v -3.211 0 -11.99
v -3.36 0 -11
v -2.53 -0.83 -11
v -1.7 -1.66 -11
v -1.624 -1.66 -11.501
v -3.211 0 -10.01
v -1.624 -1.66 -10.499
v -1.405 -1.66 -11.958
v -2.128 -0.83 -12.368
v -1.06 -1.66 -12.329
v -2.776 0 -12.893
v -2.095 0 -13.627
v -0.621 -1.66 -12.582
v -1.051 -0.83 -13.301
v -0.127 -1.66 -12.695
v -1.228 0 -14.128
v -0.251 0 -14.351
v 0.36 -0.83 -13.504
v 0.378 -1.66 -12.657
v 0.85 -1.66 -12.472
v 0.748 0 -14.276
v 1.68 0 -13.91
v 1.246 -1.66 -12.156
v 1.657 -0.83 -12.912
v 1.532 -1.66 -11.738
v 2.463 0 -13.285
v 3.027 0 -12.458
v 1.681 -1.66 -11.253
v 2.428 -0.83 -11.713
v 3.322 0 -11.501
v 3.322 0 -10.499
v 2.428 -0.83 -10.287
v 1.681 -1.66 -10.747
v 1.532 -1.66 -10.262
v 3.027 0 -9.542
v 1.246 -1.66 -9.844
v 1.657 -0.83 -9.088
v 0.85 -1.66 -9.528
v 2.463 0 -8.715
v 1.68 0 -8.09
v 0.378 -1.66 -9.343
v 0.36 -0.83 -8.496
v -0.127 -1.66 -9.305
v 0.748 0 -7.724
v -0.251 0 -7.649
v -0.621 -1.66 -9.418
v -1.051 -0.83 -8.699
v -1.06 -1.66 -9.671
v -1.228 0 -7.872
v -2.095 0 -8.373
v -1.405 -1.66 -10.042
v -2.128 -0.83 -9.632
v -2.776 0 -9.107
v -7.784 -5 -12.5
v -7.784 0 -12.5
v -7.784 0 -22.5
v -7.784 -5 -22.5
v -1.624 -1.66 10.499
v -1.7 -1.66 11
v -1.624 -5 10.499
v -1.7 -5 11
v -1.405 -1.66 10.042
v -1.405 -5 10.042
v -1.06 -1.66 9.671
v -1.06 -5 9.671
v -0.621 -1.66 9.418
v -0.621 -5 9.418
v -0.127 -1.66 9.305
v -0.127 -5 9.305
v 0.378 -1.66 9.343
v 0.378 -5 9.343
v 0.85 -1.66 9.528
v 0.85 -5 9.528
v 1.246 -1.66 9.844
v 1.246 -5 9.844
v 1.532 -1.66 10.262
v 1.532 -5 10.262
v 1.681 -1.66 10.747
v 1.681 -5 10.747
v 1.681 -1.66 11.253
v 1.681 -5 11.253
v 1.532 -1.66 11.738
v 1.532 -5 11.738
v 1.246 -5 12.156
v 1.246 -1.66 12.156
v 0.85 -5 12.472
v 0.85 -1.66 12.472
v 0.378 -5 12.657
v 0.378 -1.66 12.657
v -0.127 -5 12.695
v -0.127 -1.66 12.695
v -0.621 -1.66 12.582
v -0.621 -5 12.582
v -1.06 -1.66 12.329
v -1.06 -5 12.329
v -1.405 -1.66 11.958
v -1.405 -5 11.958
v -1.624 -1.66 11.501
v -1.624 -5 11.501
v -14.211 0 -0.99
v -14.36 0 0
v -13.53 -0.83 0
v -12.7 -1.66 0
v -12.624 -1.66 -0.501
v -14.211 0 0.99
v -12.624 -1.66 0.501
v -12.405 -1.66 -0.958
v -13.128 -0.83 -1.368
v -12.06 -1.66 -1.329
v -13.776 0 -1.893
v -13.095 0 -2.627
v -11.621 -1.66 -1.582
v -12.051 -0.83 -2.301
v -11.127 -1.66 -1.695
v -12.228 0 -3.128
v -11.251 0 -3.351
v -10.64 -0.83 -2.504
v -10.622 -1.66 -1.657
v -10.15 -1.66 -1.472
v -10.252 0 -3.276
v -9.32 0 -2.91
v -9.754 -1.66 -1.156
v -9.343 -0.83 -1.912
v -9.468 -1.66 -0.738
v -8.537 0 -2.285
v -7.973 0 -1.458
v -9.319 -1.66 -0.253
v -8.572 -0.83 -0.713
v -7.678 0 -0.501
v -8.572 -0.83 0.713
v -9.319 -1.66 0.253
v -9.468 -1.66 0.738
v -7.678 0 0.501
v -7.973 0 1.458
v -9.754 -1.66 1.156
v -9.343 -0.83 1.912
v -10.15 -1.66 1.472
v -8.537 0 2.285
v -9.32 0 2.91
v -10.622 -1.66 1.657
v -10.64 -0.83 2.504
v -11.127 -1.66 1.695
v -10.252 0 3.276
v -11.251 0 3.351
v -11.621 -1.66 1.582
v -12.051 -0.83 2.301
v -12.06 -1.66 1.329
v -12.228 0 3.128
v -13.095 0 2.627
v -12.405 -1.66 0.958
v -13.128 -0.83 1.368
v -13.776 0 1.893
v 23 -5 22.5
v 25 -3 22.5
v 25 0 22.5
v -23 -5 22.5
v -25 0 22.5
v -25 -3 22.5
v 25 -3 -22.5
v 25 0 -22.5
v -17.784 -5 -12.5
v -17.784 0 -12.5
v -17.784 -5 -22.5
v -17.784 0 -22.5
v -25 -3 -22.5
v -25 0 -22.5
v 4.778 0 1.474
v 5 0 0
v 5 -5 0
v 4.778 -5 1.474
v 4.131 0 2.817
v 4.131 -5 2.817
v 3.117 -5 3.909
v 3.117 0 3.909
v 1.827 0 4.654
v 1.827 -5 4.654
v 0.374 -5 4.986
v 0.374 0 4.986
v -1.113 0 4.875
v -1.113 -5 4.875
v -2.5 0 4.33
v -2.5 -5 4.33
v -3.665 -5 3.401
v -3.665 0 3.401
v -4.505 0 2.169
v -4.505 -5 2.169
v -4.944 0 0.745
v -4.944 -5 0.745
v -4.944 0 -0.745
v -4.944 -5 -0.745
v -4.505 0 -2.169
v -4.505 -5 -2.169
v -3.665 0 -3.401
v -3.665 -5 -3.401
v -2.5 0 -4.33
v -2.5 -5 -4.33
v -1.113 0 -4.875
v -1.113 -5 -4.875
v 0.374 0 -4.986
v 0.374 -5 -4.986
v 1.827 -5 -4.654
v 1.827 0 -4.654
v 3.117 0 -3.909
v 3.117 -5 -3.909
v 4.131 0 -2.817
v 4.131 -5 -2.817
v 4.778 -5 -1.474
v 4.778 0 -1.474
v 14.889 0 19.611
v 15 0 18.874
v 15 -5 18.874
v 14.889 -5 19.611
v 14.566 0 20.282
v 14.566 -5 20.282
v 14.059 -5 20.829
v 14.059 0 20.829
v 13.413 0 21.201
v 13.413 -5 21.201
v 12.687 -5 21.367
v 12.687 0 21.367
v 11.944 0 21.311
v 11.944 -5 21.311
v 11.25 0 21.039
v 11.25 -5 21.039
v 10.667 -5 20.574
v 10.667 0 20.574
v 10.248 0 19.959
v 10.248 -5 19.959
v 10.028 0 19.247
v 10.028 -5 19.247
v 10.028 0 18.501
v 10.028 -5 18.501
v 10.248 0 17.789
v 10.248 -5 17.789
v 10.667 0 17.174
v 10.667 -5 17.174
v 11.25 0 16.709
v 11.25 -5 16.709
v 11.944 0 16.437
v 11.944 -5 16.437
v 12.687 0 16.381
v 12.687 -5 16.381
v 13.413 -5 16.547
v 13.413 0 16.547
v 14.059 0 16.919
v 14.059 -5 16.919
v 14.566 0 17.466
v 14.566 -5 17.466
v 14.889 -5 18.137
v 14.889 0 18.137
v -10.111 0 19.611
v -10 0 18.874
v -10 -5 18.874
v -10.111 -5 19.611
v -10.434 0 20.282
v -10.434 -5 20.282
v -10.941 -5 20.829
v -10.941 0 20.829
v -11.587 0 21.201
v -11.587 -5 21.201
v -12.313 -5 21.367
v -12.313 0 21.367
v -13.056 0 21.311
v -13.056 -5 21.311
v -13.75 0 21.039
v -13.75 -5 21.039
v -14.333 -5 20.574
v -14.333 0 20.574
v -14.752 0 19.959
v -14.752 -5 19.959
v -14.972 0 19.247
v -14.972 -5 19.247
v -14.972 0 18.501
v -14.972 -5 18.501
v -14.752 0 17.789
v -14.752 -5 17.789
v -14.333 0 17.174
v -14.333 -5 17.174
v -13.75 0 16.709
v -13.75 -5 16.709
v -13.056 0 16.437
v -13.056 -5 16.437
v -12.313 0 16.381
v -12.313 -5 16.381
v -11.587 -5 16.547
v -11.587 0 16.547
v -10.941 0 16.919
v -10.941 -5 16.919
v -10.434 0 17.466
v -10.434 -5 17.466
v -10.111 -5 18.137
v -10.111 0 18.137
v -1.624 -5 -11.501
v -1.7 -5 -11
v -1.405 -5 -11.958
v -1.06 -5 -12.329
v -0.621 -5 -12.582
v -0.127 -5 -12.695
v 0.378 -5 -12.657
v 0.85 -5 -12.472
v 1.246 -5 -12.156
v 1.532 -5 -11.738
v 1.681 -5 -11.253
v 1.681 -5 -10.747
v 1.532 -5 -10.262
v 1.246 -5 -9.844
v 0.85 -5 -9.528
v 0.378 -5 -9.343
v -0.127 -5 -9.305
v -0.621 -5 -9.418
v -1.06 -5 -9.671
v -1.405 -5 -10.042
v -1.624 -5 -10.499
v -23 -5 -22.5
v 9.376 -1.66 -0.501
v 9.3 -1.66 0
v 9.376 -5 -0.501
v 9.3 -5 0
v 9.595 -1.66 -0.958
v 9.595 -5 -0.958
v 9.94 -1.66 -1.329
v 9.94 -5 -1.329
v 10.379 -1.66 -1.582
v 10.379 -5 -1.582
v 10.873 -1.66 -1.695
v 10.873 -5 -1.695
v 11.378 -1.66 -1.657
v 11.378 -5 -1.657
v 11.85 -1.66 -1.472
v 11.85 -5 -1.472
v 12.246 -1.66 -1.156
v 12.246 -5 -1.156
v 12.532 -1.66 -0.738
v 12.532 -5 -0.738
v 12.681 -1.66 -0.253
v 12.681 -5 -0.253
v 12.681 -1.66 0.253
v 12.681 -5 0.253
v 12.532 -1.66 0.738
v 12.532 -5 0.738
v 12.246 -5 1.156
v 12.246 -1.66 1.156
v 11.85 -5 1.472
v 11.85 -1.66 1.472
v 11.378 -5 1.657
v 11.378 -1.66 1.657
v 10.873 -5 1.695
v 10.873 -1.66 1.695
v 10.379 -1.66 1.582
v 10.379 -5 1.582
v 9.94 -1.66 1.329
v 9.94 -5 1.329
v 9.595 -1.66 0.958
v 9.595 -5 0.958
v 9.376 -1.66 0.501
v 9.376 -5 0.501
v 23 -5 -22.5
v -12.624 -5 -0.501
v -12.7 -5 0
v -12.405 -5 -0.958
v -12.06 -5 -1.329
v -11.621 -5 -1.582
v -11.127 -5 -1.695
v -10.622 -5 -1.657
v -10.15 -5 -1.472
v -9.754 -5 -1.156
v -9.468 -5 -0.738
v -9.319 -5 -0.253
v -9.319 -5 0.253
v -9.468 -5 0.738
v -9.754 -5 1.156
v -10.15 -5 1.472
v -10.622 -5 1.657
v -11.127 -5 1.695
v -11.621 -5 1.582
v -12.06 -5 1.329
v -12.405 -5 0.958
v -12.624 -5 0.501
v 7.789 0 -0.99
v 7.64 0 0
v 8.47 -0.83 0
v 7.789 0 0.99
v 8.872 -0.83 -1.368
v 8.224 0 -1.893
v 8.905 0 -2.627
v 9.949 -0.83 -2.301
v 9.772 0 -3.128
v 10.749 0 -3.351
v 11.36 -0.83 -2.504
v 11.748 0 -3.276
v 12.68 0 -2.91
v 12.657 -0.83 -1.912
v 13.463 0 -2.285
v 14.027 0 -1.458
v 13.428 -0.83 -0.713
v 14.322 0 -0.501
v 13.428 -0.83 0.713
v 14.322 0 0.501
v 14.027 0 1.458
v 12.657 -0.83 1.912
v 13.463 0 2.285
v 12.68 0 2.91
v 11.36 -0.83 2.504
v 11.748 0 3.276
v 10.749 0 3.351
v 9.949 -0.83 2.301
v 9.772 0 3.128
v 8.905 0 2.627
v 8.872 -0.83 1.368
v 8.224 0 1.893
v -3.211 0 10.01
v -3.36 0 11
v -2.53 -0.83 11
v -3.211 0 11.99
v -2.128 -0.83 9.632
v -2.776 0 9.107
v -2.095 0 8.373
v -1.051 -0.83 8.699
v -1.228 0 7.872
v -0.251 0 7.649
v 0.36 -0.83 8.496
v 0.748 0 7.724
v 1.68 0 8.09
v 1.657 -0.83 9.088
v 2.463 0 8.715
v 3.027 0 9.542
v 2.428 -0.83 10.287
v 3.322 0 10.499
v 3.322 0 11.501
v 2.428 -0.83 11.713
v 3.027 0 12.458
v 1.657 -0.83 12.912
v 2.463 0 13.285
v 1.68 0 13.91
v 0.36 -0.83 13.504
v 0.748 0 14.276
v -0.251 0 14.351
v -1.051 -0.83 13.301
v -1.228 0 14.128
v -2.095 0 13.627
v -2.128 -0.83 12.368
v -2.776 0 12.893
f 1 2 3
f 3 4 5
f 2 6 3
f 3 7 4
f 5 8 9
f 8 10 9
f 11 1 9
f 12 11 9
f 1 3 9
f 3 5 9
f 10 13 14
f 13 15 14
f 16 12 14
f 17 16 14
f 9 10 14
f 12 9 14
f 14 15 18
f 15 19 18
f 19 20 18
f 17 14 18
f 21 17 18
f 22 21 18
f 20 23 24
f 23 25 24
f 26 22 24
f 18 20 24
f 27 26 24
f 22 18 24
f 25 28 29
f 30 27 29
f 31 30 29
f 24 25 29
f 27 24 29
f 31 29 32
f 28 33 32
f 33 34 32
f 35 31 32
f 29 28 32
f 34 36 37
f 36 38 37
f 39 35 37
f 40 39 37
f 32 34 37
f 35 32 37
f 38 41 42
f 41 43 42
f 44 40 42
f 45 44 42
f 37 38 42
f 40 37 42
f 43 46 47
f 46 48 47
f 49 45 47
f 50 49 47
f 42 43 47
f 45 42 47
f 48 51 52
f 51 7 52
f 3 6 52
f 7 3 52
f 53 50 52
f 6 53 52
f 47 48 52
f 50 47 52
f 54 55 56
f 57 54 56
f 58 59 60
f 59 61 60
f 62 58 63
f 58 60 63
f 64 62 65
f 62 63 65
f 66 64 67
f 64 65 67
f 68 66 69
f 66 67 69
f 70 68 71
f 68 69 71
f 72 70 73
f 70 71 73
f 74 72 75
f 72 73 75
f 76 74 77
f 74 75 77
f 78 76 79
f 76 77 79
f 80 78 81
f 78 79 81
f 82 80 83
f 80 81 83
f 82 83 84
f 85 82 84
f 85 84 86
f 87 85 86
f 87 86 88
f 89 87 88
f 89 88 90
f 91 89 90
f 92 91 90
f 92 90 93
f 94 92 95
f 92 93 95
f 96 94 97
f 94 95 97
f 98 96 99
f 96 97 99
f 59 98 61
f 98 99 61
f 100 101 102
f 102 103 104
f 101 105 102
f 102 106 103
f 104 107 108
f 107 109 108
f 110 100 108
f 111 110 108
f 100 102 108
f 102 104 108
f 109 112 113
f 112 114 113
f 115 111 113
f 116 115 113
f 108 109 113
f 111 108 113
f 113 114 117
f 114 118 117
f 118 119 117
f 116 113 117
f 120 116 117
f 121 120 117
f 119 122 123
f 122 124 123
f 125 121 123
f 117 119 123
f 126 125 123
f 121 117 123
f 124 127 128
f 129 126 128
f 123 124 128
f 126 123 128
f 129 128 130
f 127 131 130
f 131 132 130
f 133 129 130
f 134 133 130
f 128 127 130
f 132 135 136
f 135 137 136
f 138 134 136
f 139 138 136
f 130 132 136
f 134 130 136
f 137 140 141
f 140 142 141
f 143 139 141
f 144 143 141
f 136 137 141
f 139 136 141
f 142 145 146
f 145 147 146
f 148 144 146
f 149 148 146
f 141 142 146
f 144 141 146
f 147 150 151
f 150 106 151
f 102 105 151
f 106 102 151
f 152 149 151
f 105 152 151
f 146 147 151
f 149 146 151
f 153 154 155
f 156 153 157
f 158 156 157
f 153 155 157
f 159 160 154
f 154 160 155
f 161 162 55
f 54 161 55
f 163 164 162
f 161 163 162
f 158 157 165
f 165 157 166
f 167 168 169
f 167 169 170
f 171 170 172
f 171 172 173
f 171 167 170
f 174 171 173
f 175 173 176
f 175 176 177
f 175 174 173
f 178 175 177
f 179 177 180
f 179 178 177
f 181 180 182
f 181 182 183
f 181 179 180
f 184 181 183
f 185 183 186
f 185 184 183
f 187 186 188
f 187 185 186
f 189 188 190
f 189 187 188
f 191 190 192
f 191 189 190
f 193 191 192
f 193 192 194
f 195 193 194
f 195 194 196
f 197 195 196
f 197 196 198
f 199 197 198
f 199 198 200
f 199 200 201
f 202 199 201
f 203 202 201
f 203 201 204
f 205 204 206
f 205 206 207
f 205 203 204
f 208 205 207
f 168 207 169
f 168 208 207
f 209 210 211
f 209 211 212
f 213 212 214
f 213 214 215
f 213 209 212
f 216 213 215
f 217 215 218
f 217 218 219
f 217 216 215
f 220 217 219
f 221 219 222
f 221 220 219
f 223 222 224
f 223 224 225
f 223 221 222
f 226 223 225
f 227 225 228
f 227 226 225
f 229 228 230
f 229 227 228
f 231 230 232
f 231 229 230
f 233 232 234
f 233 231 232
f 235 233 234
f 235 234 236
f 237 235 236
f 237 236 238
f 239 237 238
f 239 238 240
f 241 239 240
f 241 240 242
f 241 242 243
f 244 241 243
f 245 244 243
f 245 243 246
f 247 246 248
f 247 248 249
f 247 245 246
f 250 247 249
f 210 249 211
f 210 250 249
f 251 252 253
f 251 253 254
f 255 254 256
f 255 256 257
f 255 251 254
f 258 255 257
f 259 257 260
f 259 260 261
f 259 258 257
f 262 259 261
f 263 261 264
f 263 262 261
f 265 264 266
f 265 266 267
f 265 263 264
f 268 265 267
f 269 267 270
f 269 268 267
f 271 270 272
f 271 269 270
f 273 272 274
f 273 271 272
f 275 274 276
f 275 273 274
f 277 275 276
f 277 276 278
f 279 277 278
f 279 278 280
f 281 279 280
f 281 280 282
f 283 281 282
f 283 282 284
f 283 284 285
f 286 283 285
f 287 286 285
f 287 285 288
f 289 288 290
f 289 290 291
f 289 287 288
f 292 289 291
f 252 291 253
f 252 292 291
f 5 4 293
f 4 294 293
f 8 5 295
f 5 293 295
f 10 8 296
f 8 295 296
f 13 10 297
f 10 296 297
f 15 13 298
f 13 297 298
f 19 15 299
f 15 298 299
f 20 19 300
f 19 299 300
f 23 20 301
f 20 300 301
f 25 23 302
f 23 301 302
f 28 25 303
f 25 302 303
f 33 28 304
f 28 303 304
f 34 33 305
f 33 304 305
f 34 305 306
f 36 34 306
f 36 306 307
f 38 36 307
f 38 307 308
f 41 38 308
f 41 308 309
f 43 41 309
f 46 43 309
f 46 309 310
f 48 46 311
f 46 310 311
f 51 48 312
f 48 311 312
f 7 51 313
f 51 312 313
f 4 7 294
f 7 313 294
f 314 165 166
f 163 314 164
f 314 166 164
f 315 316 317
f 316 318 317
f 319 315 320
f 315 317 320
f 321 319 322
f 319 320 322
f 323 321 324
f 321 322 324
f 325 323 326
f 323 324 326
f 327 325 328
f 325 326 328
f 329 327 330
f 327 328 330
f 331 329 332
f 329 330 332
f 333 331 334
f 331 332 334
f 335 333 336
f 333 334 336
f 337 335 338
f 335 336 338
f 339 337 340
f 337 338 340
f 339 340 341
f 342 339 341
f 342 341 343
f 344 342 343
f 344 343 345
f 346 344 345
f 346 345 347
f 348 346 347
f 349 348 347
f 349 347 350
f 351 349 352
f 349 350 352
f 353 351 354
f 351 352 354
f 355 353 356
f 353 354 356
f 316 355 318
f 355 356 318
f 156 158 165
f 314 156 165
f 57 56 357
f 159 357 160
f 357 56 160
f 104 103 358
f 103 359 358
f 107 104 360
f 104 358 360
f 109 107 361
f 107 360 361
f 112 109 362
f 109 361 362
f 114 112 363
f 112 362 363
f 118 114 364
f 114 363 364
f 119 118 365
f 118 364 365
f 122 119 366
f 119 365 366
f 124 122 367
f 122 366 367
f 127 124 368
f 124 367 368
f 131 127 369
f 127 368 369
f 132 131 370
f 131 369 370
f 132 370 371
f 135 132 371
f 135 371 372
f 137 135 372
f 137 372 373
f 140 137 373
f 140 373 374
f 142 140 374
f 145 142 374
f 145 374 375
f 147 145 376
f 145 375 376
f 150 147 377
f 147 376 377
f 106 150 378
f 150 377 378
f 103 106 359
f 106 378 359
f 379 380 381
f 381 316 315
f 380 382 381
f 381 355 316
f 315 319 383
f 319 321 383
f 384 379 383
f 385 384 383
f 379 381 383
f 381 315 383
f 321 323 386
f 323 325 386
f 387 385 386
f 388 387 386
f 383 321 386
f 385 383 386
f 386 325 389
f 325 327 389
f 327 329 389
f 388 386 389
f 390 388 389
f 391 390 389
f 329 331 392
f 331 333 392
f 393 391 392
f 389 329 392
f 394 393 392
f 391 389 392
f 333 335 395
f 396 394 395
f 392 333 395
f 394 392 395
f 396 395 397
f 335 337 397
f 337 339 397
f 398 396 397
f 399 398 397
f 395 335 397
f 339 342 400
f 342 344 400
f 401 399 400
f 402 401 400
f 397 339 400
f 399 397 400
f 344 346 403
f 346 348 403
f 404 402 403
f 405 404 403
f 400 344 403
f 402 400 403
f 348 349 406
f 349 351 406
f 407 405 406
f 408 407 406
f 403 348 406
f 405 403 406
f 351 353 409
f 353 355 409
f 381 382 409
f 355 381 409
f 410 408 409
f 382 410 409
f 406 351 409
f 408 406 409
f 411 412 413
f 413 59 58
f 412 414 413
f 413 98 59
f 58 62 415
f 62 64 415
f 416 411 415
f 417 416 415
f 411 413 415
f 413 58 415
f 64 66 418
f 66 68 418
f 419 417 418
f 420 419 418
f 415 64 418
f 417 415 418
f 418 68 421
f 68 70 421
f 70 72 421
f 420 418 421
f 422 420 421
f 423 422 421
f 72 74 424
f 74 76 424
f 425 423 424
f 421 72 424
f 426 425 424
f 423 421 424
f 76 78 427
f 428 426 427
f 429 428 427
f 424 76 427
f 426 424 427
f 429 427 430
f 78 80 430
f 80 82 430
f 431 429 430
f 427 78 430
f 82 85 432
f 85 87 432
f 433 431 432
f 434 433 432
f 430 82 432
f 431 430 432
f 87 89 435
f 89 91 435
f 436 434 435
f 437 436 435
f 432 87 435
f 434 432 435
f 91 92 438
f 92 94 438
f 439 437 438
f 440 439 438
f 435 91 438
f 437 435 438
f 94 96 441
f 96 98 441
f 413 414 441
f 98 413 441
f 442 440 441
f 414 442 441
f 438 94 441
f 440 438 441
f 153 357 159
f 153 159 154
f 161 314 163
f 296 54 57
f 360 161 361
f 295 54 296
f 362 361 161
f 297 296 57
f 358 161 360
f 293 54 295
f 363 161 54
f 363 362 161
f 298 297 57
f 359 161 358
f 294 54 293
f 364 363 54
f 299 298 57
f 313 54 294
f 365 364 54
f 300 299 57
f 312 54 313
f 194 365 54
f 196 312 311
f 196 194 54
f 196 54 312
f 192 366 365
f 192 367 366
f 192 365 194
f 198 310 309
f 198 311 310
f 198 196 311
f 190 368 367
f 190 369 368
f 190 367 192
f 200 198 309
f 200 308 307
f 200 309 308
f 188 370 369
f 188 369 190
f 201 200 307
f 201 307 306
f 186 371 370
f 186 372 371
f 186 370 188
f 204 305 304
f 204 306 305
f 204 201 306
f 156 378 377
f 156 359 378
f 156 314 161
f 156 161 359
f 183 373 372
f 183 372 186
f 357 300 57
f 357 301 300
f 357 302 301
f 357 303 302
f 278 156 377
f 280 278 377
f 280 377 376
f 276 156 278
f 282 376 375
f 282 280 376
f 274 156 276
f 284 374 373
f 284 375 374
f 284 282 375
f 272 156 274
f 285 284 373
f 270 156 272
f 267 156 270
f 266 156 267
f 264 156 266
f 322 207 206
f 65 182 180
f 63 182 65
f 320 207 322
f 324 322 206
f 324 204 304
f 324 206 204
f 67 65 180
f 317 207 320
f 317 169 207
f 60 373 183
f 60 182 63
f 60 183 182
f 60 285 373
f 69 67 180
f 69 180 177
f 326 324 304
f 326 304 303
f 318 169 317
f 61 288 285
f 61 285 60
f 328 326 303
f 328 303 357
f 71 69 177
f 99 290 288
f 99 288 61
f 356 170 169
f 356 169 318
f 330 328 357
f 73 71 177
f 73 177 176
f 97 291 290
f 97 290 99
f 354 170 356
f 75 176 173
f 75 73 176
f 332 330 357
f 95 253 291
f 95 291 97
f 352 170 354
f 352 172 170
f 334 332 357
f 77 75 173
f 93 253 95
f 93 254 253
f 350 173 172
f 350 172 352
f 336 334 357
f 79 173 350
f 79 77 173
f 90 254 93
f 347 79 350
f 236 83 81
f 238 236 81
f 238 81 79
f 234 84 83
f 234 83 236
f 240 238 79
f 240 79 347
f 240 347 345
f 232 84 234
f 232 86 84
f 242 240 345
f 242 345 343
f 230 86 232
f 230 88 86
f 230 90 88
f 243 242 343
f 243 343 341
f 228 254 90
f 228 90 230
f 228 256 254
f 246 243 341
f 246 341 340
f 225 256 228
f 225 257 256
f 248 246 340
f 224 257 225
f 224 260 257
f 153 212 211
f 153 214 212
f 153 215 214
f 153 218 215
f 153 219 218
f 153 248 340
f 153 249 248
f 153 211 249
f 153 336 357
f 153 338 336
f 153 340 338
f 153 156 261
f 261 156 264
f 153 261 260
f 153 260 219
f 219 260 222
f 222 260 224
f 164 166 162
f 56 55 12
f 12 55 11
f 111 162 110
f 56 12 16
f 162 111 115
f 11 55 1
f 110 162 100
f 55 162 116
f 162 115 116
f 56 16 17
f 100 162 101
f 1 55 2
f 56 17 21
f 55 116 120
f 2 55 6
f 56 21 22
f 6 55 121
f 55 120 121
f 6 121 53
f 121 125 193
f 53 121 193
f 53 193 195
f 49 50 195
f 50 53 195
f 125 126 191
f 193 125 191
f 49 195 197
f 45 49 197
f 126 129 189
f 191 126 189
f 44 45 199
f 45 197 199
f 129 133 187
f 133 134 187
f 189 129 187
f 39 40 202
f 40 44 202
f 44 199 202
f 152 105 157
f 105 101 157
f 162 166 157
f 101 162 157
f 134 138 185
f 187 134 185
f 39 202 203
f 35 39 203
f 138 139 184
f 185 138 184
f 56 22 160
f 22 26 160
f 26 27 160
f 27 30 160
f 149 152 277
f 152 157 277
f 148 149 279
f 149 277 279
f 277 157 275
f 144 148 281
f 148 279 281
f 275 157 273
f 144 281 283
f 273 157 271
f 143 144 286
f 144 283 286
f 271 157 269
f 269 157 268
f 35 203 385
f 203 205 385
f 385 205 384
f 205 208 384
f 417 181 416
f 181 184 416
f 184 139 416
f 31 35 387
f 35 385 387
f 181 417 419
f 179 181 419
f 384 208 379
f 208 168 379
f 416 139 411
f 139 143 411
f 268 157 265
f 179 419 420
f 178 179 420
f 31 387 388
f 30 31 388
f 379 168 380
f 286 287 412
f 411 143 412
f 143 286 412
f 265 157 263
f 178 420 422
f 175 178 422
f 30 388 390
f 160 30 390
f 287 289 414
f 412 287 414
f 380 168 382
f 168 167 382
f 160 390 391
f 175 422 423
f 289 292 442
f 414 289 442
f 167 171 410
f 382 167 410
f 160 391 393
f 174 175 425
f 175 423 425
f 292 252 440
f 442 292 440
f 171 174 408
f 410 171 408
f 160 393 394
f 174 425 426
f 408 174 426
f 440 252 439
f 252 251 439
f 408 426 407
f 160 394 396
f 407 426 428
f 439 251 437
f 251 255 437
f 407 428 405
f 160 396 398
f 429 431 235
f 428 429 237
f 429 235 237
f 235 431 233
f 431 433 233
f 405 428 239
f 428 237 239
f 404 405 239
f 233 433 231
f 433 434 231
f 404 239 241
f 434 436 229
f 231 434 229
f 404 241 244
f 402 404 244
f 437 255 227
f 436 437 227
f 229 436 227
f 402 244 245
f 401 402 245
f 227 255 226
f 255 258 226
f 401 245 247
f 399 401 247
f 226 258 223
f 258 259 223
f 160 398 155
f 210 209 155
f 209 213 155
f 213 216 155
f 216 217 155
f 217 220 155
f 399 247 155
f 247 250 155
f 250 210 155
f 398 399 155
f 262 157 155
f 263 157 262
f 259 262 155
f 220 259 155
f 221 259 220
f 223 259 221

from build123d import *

# Parameters (mm, degrees)
F0_R           = 1.5
F0_R_2         = 2.5
F0_R_3         = 5
F1_DEPTH       = 5
F2_D           = 3.4
F2_CSINK_D     = 6.72
F2_CSINK_ANGLE = 90
F3_SIZE        = 2


with BuildPart() as f1:
    # F0 (on Front) → F1 (new body)
    with BuildSketch(Plane.XZ):
        Polygon((25, -22.5), (25, 22.5), (-25, 22.5), (-25, -22.5), (-17.784204334, -22.5), (-17.784204334, -12.5), (-7.784204334, -12.5), (-7.784204334, -22.5), align=None)
        with Locations((0, -11)):
            Circle(F0_R, mode=Mode.SUBTRACT)
        with Locations((-11, 0)):
            Circle(F0_R, mode=Mode.SUBTRACT)
        with Locations((-12.5, 18.8740361482)):
            Circle(F0_R_2, mode=Mode.SUBTRACT)
        Circle(F0_R_3, mode=Mode.SUBTRACT)
        with Locations((11, 0)):
            Circle(F0_R, mode=Mode.SUBTRACT)
        with Locations((0, 11)):
            Circle(F0_R, mode=Mode.SUBTRACT)
        with Locations((12.5, 18.8740361482)):
            Circle(F0_R_2, mode=Mode.SUBTRACT)
    extrude(amount=F1_DEPTH)

    # F2 (through all)
    with Locations(Plane(origin=(0, 0, 0), x_dir=(1, 0, 0), z_dir=(0, 1, 0))):
        with Locations((-11, 0), (11, 0), (0, -11), (0, 11)):
            CounterSinkHole(F2_D / 2, F2_CSINK_D / 2, counter_sink_angle=F2_CSINK_ANGLE)

    # F3
    f3_edges = [f1.edges().sort_by_distance(p)[0] for p in [
        (25, -5, 0),
        (-25, -5, 0),
    ]]
    chamfer(f3_edges, length=F3_SIZE)


solid = f1.part
